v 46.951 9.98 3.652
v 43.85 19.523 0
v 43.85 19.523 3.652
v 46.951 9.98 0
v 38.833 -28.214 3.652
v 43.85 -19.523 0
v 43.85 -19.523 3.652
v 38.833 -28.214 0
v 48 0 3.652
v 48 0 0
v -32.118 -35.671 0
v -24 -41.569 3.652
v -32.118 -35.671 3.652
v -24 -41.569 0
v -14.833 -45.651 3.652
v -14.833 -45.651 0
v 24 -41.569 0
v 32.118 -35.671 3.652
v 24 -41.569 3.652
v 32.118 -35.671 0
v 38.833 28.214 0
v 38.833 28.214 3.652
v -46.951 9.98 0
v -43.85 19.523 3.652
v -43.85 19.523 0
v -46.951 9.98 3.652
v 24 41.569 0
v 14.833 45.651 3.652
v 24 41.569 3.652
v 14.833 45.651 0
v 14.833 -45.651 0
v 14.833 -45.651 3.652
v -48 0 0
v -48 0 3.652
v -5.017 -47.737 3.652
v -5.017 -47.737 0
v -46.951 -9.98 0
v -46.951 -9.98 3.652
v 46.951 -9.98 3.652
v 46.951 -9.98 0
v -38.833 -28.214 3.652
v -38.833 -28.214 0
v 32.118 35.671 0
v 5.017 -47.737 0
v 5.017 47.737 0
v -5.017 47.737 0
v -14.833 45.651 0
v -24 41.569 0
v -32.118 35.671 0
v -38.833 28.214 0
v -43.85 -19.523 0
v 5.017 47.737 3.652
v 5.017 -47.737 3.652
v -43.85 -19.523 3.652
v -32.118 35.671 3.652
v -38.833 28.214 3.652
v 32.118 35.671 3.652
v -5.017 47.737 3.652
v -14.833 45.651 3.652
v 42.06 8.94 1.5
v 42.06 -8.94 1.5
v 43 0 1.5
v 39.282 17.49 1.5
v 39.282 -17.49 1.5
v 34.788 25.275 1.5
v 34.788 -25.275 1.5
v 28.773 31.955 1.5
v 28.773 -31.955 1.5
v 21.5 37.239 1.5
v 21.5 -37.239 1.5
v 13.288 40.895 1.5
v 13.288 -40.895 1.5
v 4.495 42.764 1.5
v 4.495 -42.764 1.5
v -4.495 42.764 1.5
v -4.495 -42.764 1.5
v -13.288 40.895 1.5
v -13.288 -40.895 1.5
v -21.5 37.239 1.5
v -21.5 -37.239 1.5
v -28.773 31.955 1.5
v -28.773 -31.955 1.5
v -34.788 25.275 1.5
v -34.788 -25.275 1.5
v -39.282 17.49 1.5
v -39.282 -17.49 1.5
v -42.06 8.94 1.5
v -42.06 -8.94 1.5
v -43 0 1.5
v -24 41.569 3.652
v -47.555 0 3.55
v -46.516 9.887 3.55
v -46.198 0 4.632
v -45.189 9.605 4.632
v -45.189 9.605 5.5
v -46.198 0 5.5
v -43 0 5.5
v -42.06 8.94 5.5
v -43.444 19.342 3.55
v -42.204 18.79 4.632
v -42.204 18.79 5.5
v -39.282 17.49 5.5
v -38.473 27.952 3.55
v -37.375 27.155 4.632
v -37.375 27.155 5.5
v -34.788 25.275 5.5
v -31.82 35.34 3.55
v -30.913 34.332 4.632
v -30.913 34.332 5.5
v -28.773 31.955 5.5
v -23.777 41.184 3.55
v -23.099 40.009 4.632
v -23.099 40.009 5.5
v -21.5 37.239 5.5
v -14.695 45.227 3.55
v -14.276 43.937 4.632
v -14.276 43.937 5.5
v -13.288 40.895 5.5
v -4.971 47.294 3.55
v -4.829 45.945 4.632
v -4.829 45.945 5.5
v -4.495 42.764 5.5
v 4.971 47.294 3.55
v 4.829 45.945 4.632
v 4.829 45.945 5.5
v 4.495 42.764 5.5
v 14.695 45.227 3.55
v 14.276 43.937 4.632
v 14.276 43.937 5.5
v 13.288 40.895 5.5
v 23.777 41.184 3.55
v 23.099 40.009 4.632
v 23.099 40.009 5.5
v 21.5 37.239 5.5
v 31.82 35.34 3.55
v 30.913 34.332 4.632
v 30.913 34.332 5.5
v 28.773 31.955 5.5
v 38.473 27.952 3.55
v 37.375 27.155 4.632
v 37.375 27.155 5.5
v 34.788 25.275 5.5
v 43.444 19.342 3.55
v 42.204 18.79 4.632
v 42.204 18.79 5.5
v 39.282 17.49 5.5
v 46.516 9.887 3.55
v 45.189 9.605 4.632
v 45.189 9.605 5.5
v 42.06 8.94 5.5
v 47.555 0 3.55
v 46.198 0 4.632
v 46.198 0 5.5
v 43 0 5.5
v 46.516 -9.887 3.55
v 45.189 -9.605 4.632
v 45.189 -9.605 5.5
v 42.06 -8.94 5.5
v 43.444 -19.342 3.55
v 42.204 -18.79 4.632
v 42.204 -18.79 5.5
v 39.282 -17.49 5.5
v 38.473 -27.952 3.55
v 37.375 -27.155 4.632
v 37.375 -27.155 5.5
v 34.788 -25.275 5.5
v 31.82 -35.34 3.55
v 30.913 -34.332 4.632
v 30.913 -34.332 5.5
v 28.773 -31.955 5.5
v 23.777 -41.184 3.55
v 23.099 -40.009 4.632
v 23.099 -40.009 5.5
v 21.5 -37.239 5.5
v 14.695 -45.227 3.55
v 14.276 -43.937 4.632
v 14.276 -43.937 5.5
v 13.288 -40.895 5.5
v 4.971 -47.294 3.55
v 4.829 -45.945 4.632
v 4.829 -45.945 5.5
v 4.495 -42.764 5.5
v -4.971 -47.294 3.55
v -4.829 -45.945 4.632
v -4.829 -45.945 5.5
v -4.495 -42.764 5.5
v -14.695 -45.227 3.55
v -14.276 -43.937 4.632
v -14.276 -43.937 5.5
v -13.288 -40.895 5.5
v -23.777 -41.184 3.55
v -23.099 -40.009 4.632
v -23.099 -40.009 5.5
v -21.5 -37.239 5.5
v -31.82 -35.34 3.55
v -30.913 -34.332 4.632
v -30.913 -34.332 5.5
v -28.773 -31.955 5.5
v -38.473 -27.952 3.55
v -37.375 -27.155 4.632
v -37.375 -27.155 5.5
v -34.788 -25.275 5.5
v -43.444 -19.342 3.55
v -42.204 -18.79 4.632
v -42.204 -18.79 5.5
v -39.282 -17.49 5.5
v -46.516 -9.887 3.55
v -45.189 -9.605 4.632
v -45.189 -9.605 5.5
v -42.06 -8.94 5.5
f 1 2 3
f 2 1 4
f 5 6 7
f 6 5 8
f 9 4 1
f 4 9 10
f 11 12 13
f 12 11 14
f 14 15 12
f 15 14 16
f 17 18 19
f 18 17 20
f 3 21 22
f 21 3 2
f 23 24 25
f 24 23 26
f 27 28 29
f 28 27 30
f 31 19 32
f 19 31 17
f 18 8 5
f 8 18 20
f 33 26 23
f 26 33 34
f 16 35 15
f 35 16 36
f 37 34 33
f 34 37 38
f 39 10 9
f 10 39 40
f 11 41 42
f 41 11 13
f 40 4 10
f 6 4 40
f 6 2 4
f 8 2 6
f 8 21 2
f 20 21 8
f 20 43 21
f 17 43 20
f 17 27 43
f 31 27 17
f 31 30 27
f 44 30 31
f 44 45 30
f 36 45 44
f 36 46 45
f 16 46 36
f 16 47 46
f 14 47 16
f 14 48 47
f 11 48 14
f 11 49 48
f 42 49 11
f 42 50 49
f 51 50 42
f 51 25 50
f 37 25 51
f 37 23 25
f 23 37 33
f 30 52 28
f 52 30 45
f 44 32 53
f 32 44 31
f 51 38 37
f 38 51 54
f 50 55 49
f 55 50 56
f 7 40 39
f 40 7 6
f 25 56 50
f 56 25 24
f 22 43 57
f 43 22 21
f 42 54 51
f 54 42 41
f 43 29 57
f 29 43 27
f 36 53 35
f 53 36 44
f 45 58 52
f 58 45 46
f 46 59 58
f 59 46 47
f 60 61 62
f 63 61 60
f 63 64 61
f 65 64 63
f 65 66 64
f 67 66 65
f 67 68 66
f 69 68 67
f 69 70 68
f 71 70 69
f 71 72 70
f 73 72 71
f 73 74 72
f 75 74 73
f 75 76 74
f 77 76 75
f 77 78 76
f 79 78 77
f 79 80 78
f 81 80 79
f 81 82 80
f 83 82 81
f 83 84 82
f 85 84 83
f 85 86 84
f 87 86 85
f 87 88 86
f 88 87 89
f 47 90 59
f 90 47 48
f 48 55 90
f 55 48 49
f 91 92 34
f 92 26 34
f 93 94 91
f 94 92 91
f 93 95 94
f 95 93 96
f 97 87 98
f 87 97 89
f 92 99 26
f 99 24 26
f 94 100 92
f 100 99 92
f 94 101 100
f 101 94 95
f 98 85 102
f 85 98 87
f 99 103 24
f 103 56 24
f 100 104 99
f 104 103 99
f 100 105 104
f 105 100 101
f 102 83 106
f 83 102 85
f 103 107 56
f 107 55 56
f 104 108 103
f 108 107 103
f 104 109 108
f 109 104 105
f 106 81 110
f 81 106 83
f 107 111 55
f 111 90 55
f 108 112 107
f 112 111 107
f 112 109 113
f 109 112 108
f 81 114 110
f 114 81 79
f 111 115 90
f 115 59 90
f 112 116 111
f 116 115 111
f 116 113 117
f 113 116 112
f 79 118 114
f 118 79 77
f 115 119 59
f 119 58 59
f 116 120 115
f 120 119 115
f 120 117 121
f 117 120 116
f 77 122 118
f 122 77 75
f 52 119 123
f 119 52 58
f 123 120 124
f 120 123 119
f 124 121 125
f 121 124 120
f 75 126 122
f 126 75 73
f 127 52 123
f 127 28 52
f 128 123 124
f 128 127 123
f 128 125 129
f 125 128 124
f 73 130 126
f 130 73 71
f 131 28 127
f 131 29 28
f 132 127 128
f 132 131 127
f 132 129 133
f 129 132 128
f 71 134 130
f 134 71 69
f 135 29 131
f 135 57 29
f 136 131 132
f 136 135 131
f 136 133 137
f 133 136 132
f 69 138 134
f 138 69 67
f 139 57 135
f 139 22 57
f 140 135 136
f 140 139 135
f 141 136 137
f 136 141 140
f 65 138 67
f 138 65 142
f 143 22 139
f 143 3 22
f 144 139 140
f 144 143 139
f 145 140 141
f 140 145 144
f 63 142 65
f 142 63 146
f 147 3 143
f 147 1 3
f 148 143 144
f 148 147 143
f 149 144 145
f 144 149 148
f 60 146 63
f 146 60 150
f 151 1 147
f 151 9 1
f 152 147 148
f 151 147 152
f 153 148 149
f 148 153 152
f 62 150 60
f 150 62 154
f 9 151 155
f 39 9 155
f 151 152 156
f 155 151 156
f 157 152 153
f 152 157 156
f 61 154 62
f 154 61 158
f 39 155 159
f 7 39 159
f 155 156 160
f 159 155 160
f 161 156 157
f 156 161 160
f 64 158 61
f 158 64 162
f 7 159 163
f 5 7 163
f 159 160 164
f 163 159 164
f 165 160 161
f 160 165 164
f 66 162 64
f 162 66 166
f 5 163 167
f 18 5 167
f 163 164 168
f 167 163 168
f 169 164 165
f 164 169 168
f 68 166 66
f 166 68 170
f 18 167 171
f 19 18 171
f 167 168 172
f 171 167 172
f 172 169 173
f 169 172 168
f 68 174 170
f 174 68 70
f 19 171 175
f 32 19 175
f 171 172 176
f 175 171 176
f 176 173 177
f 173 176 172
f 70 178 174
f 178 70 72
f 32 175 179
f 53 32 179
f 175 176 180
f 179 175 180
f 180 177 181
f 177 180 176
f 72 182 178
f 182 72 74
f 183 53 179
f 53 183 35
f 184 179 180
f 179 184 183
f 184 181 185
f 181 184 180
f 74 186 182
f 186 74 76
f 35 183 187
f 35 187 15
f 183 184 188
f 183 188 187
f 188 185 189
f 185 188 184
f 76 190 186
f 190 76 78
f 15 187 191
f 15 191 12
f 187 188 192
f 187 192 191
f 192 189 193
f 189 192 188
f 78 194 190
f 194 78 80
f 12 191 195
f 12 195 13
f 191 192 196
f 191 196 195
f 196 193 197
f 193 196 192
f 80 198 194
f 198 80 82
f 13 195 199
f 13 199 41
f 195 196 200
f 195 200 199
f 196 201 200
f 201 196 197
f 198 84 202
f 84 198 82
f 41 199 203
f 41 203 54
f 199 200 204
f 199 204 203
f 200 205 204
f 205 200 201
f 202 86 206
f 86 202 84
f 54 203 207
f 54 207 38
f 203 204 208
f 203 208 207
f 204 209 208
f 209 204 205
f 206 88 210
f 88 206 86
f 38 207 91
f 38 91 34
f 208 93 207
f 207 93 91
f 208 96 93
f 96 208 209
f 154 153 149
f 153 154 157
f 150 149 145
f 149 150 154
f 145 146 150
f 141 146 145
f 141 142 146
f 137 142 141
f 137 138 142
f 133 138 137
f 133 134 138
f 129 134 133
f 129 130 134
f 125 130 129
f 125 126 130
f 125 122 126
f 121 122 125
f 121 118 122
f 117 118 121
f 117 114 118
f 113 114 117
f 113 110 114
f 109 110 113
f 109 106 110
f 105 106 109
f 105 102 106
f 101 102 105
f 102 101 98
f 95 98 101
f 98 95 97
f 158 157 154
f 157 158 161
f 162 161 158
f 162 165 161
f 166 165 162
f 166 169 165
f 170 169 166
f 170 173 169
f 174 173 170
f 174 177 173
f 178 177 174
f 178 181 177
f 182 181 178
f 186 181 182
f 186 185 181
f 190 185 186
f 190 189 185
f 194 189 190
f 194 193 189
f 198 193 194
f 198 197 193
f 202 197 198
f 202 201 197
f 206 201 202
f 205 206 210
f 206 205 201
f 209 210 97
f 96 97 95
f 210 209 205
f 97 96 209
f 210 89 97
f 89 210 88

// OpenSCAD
module BellBase(plate_thickness, bell_bottom_diameter, fillet_height) {
  bell_bottom_radius = bell_bottom_diameter / 2;
  bottom_ridge_x = fillet_height + 1;

  translate([0, 0, plate_thickness]) {
    color("Violet")
      translate([0, 0, -plate_thickness])
      linear_extrude(height = plate_thickness)
      circle(d = bell_bottom_diameter + (2 * bottom_ridge_x));

    color("Olive")
      rotate_extrude()
      translate([bell_bottom_radius, 0, 0]) {
        union() {
          square(size = [1, fillet_height]);
          translate([1, 0, 0]) {
            intersection() {
              square(fillet_height * 2);
              difference() {
                square(fillet_height * 2, center=true);
                translate([fillet_height, fillet_height]) circle(2);
              }
            }
          }
        }
      }
  }
}

BellBase(1.5, 86, 4);
